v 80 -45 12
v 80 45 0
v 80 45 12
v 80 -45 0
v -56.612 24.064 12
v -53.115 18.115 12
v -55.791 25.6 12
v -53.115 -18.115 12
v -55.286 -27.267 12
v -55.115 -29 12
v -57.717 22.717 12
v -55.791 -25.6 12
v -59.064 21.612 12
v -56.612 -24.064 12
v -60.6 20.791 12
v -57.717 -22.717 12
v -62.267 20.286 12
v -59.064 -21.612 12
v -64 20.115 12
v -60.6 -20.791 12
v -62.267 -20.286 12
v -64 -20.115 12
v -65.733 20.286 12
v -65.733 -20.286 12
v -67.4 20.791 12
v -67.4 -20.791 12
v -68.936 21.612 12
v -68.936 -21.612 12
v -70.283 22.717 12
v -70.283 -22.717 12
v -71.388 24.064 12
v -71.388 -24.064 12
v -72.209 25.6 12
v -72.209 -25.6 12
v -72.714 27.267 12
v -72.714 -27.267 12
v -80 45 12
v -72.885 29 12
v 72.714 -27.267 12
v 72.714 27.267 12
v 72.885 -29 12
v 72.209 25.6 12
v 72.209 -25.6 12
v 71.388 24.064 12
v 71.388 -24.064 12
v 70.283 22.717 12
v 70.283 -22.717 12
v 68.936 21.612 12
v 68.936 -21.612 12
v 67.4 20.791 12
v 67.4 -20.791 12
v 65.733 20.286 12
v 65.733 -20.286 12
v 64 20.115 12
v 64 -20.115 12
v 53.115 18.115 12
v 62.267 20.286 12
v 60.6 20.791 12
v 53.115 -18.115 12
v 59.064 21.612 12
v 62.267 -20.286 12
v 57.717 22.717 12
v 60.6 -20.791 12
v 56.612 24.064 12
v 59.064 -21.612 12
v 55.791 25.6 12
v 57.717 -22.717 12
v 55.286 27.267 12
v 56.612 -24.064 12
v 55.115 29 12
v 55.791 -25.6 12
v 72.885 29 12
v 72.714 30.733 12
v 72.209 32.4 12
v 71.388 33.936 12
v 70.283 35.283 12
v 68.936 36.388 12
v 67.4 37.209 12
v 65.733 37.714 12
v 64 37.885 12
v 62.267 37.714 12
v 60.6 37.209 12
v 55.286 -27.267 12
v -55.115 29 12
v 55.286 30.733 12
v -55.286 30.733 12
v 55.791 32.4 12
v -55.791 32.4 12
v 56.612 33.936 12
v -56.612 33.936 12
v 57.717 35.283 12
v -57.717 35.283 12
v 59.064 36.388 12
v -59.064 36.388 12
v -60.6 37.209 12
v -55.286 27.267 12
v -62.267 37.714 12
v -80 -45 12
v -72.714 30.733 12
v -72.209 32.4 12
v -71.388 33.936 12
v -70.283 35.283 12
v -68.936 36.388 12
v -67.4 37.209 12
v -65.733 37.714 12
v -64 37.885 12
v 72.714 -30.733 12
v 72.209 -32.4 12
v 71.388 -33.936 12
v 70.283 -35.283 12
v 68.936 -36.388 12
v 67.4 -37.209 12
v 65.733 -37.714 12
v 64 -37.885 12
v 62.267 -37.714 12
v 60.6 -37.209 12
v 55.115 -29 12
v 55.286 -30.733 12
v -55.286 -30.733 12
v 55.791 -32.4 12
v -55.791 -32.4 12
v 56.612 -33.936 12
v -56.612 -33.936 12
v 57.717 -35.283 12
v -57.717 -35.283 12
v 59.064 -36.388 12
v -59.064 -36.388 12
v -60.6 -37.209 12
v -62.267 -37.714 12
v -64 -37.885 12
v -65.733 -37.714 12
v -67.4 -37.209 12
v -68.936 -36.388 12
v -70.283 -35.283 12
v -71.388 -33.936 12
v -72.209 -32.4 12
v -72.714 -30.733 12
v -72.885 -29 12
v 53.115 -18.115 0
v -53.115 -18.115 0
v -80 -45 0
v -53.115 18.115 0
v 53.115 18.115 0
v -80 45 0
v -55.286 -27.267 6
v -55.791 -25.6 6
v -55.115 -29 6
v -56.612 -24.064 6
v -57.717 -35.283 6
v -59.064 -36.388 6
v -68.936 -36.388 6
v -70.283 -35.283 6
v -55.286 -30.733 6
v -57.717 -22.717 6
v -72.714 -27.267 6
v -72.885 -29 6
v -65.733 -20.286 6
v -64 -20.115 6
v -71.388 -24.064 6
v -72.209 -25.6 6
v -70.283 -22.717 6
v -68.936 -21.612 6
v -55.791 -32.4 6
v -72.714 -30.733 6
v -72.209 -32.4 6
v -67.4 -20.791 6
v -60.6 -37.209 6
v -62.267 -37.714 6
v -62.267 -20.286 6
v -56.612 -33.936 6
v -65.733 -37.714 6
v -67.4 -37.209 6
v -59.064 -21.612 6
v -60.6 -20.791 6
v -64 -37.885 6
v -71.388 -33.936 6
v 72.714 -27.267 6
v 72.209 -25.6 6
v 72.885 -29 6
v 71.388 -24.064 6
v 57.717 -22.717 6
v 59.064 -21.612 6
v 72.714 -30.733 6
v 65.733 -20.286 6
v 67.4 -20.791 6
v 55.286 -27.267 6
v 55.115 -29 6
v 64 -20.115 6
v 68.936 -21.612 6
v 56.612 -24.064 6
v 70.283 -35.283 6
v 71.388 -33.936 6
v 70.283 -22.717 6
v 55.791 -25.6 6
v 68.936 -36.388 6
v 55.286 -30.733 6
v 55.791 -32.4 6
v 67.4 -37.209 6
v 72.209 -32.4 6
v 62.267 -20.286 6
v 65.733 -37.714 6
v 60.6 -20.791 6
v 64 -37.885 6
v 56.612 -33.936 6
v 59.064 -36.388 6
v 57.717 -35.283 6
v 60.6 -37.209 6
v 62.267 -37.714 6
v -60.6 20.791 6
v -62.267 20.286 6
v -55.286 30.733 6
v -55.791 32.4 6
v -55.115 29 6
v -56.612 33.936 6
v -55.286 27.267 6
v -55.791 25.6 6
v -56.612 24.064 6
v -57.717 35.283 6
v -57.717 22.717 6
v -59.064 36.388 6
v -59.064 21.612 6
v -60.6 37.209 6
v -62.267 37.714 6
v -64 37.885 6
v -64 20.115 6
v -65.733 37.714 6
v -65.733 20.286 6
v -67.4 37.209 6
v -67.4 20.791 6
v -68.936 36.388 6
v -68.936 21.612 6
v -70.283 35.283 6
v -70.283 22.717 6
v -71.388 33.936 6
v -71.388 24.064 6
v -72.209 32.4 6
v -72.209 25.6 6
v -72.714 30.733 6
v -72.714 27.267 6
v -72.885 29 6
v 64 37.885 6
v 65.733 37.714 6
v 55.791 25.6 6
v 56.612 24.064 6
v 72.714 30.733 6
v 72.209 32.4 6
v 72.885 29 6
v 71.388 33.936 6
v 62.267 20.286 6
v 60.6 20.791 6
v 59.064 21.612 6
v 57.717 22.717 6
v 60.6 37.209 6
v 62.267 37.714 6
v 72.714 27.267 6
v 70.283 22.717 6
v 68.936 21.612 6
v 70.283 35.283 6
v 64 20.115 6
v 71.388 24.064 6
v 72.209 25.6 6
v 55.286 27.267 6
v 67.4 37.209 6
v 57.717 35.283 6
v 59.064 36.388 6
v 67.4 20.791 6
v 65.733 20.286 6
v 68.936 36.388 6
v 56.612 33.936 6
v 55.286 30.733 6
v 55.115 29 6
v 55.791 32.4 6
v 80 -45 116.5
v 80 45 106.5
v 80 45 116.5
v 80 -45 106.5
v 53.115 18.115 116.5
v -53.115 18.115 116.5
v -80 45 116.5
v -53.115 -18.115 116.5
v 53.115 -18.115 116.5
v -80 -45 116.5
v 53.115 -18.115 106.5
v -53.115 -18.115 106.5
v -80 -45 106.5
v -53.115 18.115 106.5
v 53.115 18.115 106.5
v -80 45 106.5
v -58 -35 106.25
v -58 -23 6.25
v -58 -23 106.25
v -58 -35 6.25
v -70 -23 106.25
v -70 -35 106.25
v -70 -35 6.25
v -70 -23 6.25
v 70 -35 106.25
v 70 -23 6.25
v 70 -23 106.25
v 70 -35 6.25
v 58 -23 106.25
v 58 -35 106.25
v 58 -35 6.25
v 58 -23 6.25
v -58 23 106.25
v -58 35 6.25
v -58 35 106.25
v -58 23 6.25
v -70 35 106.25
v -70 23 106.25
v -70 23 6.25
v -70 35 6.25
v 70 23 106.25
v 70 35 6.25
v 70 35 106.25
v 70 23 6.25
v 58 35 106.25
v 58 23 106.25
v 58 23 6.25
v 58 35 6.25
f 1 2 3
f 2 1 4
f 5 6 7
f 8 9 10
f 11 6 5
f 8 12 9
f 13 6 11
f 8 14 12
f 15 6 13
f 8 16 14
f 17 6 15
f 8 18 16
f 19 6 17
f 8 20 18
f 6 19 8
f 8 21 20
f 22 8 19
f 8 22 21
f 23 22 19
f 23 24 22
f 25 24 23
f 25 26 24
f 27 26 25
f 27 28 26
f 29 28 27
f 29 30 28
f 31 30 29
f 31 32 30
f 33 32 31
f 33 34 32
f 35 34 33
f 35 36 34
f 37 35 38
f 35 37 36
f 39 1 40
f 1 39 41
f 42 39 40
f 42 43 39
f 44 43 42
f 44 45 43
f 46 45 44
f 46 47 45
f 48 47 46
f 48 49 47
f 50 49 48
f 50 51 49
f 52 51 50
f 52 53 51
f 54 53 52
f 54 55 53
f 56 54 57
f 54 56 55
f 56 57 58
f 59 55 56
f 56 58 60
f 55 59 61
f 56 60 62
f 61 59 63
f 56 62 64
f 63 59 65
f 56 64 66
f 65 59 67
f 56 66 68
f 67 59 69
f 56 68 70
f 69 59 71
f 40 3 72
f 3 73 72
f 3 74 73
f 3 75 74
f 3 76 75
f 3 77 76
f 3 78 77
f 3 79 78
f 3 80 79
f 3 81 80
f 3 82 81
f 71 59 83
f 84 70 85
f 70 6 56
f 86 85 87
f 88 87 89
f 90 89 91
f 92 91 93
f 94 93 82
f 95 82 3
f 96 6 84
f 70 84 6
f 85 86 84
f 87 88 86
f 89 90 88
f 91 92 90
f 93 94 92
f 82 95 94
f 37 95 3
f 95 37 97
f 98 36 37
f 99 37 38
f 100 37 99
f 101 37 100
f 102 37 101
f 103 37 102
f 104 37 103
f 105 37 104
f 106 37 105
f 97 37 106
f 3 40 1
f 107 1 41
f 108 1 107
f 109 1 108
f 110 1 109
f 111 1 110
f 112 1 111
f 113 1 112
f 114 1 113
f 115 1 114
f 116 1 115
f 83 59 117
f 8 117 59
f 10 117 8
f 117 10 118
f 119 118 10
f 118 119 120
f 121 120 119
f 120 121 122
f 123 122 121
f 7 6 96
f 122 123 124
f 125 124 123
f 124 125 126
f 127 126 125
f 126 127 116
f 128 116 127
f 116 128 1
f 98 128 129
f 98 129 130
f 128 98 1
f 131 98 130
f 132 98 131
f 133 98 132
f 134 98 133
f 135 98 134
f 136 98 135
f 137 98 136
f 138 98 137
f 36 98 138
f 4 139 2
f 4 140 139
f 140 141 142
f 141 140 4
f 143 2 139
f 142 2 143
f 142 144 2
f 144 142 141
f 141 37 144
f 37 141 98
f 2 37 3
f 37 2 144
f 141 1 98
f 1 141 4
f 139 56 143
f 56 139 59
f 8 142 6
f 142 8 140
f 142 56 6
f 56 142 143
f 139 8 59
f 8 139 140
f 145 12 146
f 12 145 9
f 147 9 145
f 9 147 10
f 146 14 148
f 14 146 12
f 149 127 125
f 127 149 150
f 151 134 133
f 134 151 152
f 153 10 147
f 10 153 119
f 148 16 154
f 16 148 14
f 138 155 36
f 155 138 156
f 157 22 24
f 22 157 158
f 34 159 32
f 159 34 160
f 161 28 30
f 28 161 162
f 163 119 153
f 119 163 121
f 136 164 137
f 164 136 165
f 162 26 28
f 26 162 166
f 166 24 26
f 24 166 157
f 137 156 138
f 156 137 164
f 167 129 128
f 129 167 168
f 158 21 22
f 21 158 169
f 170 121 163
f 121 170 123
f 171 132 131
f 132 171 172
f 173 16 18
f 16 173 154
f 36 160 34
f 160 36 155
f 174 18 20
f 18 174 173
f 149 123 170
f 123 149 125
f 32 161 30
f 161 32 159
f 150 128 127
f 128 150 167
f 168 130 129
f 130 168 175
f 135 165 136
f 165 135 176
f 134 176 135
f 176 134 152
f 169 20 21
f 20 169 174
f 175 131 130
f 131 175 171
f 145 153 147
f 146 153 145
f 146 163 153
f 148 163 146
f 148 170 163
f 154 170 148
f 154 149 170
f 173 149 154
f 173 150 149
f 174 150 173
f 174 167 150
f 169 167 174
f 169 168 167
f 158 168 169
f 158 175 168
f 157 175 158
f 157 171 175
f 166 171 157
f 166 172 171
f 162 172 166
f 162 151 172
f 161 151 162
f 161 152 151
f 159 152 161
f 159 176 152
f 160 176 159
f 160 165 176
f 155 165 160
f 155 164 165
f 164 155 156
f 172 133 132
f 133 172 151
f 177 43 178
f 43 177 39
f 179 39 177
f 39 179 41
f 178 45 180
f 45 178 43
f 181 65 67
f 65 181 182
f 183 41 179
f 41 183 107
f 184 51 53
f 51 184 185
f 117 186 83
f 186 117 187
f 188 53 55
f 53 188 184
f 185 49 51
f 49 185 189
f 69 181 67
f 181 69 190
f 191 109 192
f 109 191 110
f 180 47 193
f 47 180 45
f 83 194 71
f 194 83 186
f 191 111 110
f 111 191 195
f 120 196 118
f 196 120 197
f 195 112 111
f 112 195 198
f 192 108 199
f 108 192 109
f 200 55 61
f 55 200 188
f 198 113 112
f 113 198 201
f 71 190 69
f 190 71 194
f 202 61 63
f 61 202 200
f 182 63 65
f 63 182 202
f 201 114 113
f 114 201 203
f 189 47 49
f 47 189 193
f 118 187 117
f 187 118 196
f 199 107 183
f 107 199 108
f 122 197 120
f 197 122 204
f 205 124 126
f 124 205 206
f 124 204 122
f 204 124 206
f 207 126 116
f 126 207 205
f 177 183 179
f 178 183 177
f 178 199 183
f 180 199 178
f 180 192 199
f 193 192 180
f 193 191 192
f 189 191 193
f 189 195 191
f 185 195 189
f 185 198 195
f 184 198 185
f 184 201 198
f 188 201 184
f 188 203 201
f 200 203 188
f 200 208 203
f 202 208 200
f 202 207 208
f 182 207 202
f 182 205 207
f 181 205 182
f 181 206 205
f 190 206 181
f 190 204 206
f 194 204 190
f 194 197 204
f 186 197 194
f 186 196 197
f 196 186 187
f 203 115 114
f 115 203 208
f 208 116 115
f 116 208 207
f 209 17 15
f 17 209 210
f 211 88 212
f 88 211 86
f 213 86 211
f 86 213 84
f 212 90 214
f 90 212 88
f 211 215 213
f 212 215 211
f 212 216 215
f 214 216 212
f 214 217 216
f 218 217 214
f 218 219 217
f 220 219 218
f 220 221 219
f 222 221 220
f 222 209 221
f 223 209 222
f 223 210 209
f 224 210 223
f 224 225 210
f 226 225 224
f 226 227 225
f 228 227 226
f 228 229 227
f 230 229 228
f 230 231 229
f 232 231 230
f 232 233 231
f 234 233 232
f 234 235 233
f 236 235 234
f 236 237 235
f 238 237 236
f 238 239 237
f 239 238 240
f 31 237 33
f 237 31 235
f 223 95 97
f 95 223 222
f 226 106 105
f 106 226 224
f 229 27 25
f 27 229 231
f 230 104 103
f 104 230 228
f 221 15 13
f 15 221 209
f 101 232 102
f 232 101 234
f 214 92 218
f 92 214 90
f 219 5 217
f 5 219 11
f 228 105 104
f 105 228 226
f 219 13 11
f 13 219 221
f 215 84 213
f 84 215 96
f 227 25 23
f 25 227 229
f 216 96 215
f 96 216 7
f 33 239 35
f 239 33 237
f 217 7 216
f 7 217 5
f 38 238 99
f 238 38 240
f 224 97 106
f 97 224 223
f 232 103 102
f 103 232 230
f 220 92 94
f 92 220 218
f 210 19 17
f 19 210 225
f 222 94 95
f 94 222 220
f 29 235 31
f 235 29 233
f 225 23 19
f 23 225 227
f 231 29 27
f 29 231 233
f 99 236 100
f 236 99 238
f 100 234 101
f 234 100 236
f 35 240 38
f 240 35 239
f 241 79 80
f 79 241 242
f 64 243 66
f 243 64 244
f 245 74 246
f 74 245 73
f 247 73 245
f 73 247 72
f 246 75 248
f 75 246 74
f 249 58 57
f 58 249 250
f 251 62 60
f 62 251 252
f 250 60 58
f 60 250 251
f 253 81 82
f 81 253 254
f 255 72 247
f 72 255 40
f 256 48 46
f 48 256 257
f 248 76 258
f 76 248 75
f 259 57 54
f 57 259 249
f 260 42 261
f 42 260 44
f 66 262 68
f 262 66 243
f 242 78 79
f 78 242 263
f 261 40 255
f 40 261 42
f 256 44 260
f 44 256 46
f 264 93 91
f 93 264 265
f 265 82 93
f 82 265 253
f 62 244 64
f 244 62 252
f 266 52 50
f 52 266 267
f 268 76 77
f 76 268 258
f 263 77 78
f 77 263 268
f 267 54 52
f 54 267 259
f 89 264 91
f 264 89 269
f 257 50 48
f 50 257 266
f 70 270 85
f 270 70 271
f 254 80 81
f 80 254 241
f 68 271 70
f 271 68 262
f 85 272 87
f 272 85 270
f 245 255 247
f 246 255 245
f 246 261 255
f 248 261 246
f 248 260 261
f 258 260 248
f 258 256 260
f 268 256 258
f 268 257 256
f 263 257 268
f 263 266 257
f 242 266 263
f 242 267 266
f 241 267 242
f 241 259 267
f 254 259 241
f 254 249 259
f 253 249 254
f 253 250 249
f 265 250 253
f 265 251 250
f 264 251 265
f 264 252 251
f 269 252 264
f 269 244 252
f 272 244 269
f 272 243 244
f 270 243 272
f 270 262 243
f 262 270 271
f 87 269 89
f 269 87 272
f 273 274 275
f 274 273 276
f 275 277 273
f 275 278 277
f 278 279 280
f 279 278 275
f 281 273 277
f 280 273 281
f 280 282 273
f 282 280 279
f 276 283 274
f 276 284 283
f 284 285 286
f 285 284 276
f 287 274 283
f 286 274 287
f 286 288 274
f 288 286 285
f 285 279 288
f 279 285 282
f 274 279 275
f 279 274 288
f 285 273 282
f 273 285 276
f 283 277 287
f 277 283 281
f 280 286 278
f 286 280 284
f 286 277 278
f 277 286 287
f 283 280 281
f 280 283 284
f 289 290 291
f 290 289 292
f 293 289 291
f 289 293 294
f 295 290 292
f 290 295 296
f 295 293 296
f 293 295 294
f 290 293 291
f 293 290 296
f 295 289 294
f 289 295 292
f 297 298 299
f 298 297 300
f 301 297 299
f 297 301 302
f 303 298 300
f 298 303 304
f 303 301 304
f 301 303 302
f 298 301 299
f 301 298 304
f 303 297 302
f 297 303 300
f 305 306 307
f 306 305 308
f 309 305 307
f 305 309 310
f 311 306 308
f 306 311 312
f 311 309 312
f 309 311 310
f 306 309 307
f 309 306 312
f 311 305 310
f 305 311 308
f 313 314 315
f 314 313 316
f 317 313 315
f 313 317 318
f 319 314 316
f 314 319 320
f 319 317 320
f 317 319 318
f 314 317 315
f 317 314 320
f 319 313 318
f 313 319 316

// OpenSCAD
$fn = 32;

// ------------------------------------------------------------------------
// Frame cube: base 160 x 90 mm, posts 100 mm tall
// Every part is its own module, assembly() places every instance.
// ------------------------------------------------------------------------

// --- part 1 ---
module base_frame() {
  difference() {
    translate([-80, -45, 0]) cube([160, 90, 12]);
    translate([-53.115, -18.115, -1]) cube([106.23, 36.23, 14]);
    translate([-64, -29, 6]) cylinder(h = 7, d = 17.77);
    translate([64, -29, 6]) cylinder(h = 7, d = 17.77);
    translate([-64, 29, 6]) cylinder(h = 7, d = 17.77);
    translate([64, 29, 6]) cylinder(h = 7, d = 17.77);
  }
}

// --- part 2 ---
module corner_post() {
  translate([-6, -6, 0]) cube([12, 12, 100]);
}

// --- part 3 ---
module top_frame() {
  difference() {
    translate([-80, -45, 0]) cube([160, 90, 10]);
    translate([-53.115, -18.115, -1]) cube([106.23, 36.23, 12]);
  }
}

// --- assembly ---
module assembly() {
  color([0.80, 0.24, 0.20]) translate([0, 0, 0]) rotate([0, 0, 0]) base_frame();
  color([0.20, 0.45, 0.75]) translate([-64, -29, 6.25]) rotate([0, 0, 0]) corner_post();
  color([0.25, 0.62, 0.32]) translate([64, -29, 6.25]) rotate([0, 0, 0]) corner_post();
  color([0.92, 0.70, 0.18]) translate([-64, 29, 6.25]) rotate([0, 0, 0]) corner_post();
  color([0.58, 0.35, 0.70]) translate([64, 29, 6.25]) rotate([0, 0, 0]) corner_post();
  color([0.16, 0.66, 0.66]) translate([0, 0, 106.5]) rotate([0, 0, 0]) top_frame();
}

assembly();
